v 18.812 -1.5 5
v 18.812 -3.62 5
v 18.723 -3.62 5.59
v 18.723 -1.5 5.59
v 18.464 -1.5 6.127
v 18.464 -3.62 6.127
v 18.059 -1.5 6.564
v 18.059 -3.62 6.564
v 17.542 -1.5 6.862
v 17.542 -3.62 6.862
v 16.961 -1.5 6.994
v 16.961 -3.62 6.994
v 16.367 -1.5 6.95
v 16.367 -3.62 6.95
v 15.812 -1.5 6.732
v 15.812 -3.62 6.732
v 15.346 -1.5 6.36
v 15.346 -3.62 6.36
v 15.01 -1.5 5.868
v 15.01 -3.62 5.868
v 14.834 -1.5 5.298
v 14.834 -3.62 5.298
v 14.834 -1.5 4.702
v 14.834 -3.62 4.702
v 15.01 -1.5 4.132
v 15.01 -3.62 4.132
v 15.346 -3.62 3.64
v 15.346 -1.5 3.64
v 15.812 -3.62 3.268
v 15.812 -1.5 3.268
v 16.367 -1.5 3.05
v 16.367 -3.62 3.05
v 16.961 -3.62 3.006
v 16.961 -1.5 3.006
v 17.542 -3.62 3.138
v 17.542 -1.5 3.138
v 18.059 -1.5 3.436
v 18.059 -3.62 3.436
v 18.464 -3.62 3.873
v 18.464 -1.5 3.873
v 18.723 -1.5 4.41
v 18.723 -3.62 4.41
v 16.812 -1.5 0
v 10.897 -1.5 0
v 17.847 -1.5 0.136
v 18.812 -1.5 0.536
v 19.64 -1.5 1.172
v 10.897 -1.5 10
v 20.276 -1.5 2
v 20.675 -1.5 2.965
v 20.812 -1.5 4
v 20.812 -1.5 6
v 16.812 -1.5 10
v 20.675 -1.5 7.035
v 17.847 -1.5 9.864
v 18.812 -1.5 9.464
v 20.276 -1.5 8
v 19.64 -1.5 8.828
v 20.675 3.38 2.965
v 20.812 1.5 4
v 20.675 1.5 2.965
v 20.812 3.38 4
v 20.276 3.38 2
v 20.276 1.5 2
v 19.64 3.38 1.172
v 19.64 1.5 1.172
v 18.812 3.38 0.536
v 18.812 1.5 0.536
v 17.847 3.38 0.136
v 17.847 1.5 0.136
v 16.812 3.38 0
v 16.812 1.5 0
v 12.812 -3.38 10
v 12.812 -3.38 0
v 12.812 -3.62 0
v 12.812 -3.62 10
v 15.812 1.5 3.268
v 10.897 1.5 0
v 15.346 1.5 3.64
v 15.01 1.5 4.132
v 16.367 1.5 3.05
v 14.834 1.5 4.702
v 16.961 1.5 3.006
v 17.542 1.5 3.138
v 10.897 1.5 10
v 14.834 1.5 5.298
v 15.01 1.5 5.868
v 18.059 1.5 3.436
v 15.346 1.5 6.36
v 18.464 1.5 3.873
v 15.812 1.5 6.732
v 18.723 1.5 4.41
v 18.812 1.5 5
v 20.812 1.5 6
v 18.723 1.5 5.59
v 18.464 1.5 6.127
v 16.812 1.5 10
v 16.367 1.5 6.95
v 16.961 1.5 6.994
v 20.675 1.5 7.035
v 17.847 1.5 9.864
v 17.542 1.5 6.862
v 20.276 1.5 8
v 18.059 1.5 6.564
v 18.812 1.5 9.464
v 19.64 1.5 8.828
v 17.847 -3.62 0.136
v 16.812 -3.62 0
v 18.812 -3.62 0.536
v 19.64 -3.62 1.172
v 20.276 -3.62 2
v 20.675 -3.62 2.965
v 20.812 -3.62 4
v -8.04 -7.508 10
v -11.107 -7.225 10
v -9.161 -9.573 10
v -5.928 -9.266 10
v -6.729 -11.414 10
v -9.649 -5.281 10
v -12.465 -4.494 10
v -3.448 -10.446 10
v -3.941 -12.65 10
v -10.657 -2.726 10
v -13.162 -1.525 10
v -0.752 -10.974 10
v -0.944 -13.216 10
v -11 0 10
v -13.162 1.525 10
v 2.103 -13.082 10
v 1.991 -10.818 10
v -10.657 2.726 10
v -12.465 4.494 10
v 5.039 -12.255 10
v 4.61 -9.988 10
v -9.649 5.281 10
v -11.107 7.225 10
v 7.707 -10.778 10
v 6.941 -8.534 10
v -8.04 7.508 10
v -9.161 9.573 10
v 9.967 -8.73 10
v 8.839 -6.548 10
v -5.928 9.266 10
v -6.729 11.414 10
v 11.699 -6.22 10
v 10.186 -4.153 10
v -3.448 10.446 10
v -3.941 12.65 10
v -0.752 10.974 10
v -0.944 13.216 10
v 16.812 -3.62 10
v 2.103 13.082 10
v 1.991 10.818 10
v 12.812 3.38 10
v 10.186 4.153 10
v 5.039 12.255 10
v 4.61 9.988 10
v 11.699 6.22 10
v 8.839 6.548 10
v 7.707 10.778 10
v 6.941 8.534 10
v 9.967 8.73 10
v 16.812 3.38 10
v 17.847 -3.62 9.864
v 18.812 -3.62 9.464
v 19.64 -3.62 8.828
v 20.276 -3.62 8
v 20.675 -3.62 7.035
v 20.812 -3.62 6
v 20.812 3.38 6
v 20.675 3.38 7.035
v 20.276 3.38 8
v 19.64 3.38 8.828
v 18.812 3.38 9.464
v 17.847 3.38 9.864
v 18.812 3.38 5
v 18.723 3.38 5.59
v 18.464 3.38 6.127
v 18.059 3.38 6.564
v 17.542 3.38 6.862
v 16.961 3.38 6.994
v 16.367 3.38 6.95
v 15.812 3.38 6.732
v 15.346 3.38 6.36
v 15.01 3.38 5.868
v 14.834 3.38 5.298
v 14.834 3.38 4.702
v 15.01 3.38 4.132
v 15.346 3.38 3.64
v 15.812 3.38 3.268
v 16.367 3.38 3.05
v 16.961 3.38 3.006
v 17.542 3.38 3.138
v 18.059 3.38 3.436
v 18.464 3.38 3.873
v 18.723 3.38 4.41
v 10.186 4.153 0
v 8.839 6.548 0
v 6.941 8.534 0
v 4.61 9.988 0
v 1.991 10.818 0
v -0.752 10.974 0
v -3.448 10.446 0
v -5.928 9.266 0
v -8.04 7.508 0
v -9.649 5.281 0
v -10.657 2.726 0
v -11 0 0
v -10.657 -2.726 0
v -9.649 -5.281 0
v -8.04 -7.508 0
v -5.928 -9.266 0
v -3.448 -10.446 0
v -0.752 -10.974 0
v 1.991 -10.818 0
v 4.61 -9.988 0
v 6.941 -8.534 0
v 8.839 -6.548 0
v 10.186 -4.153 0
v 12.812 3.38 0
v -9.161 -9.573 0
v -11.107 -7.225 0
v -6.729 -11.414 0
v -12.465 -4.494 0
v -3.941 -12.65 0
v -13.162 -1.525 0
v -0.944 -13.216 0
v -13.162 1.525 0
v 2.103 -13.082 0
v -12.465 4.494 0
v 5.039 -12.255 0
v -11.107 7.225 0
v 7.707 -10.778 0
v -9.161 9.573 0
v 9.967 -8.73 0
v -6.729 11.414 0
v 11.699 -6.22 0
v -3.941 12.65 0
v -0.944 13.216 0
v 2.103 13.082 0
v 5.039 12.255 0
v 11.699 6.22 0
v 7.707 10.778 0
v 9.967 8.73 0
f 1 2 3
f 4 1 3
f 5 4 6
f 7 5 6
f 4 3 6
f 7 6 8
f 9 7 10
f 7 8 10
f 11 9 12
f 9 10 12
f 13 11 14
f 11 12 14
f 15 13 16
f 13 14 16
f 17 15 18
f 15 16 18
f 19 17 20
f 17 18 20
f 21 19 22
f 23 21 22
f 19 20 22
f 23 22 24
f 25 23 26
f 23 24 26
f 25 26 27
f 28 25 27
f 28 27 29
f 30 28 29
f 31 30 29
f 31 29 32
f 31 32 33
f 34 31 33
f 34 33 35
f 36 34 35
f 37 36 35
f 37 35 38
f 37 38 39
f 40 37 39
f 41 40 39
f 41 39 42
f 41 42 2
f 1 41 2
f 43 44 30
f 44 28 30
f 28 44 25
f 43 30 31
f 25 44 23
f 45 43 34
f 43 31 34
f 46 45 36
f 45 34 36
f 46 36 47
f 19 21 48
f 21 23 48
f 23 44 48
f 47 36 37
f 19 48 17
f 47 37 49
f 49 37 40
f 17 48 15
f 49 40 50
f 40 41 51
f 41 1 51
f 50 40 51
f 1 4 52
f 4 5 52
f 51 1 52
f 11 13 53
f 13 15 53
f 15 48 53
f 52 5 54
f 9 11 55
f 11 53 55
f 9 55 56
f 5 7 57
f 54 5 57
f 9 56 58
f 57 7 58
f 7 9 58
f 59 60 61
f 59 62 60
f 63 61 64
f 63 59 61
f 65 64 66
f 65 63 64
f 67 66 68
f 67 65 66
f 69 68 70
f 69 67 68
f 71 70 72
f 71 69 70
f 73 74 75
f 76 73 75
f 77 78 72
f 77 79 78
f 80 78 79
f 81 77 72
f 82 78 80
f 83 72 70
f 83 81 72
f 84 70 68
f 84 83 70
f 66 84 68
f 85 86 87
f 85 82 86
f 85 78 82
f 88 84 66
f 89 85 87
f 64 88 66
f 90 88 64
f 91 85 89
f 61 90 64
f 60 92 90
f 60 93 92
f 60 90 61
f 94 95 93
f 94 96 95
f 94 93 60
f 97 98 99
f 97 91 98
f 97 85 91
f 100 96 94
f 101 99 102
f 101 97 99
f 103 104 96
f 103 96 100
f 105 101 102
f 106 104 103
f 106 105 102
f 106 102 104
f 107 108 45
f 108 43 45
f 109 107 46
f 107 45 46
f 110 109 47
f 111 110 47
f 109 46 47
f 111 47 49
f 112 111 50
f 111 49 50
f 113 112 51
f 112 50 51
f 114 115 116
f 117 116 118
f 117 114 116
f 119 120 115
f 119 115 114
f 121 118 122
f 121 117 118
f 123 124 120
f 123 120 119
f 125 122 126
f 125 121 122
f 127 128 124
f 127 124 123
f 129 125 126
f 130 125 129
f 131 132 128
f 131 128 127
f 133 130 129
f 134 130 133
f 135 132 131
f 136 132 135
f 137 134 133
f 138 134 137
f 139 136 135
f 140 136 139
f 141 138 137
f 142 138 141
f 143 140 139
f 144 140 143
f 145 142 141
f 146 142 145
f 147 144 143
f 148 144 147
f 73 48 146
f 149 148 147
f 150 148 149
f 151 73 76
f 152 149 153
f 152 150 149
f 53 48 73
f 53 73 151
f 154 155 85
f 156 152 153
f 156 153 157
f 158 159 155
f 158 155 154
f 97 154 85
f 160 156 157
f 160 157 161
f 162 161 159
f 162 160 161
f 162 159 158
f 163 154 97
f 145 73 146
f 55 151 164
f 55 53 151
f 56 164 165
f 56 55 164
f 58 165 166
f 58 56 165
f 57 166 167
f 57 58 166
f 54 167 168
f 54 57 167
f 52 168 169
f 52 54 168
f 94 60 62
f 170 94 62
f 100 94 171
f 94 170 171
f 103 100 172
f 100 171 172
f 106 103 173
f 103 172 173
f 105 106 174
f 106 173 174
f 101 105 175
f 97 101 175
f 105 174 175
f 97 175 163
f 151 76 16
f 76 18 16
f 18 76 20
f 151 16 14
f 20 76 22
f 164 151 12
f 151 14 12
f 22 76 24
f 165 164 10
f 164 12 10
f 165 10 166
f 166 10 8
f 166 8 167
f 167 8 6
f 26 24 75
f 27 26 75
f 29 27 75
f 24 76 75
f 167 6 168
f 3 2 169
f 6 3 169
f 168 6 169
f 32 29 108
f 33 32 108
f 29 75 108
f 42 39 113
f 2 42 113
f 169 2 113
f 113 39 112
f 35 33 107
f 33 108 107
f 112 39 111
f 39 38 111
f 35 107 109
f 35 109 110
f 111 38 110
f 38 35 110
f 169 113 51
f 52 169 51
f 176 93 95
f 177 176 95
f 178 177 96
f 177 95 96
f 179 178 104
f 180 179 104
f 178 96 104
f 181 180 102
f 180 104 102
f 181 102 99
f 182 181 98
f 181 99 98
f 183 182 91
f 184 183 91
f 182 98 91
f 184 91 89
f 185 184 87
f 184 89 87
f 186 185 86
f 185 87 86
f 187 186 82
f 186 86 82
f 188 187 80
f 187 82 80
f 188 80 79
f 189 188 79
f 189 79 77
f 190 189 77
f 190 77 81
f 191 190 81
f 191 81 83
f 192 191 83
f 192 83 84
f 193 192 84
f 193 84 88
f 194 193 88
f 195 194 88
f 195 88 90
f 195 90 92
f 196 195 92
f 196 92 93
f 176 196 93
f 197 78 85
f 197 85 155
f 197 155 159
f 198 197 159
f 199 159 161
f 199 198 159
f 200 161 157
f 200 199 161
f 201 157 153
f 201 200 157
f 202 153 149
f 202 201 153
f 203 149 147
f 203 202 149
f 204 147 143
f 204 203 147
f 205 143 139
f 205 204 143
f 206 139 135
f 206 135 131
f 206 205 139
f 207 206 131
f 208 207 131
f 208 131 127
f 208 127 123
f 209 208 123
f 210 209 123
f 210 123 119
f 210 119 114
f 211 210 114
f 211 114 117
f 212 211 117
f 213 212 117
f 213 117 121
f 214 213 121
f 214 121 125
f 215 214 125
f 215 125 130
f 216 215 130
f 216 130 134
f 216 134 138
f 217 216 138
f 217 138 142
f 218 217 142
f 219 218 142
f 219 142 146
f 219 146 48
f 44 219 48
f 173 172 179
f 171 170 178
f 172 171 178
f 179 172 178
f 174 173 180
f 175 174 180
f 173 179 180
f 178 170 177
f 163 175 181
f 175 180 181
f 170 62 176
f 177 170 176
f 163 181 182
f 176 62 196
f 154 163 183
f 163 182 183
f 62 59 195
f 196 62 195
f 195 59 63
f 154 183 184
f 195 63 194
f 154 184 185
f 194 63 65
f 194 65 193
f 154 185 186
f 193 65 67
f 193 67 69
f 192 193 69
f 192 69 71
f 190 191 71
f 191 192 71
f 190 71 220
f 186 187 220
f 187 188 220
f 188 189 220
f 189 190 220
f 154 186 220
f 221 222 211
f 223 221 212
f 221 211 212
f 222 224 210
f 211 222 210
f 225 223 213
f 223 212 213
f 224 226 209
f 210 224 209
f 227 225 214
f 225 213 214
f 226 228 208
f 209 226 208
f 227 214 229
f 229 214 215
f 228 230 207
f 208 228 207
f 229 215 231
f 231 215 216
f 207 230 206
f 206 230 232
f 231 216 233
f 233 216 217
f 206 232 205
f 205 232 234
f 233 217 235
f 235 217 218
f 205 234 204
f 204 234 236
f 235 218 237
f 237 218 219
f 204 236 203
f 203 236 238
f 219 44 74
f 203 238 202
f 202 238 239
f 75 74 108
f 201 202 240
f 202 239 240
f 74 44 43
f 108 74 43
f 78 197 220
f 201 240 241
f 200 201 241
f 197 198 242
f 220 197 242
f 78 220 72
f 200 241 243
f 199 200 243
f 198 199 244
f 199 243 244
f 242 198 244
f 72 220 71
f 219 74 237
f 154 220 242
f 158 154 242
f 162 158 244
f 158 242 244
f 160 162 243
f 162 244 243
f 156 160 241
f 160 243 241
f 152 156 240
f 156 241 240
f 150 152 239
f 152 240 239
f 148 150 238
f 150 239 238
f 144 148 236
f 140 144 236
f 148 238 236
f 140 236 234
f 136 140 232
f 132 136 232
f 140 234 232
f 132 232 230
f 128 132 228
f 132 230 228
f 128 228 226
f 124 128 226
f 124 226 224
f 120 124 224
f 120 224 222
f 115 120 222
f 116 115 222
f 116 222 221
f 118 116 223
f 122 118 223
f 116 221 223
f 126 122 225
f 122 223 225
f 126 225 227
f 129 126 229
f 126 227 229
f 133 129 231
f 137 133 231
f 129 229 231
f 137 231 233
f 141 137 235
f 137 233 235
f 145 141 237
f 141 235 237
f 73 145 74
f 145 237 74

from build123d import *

# Parameters (mm, degrees)
F0_R     = 11
F1_DEPTH = 10
F2_W     = 26.7762894586
F2_H     = 3
F3_DEPTH = 11.5
F4_R     = 2
F5_DEPTH = 25
F6_R     = 4


# Not quite as in the source:
# - a feature names something its author has since deleted; it is built from what else it names


with BuildPart() as f1:
    # F0 (on Top) → F1 (new body)
    with BuildSketch(Plane.XY):
        with BuildLine():
            Line((20.8116516682, 3.3799528892), (12.8116516682, 3.3799528892))
            ThreePointArc((12.8116516682, 3.3799528892), (-13.25, 0), (12.8116516682, -3.3799528892))
            Line((12.8116516682, -3.3799528892), (12.8116516682, -3.6200471108))
            Line((12.8116516682, -3.6200471108), (20.8116516682, -3.6200471108))
            Line((20.8116516682, -3.6200471108), (20.8116516682, 3.3799528892))
        make_face()
        Circle(F0_R, mode=Mode.SUBTRACT)
    extrude(amount=F1_DEPTH)

    # F2 (on Top) → F3 (cut, symmetric)
    with BuildSketch(Plane.XY):
        with Locations((19.2577867381, 0)):
            Rectangle(F2_W, F2_H)
    extrude(amount=F3_DEPTH, both=True, mode=Mode.SUBTRACT)

    # F4 (on face) → F5 (cut)
    with BuildSketch(Plane.XZ.offset(3.6200471108)):
        with Locations((16.8116516682, 5)):
            Circle(F4_R)
    extrude(amount=-F5_DEPTH, mode=Mode.SUBTRACT)

    # F6
    f6_edges = [f1.edges().sort_by_distance(p)[0] for p in [
        (20.811652, -2.560024, 10),
        (20.811652, 2.439976, 10),
        (20.811652, 2.439976, 0),
        (20.811652, -2.560024, 0),
    ]]
    fillet(f6_edges, radius=F6_R)


solid = f1.part
